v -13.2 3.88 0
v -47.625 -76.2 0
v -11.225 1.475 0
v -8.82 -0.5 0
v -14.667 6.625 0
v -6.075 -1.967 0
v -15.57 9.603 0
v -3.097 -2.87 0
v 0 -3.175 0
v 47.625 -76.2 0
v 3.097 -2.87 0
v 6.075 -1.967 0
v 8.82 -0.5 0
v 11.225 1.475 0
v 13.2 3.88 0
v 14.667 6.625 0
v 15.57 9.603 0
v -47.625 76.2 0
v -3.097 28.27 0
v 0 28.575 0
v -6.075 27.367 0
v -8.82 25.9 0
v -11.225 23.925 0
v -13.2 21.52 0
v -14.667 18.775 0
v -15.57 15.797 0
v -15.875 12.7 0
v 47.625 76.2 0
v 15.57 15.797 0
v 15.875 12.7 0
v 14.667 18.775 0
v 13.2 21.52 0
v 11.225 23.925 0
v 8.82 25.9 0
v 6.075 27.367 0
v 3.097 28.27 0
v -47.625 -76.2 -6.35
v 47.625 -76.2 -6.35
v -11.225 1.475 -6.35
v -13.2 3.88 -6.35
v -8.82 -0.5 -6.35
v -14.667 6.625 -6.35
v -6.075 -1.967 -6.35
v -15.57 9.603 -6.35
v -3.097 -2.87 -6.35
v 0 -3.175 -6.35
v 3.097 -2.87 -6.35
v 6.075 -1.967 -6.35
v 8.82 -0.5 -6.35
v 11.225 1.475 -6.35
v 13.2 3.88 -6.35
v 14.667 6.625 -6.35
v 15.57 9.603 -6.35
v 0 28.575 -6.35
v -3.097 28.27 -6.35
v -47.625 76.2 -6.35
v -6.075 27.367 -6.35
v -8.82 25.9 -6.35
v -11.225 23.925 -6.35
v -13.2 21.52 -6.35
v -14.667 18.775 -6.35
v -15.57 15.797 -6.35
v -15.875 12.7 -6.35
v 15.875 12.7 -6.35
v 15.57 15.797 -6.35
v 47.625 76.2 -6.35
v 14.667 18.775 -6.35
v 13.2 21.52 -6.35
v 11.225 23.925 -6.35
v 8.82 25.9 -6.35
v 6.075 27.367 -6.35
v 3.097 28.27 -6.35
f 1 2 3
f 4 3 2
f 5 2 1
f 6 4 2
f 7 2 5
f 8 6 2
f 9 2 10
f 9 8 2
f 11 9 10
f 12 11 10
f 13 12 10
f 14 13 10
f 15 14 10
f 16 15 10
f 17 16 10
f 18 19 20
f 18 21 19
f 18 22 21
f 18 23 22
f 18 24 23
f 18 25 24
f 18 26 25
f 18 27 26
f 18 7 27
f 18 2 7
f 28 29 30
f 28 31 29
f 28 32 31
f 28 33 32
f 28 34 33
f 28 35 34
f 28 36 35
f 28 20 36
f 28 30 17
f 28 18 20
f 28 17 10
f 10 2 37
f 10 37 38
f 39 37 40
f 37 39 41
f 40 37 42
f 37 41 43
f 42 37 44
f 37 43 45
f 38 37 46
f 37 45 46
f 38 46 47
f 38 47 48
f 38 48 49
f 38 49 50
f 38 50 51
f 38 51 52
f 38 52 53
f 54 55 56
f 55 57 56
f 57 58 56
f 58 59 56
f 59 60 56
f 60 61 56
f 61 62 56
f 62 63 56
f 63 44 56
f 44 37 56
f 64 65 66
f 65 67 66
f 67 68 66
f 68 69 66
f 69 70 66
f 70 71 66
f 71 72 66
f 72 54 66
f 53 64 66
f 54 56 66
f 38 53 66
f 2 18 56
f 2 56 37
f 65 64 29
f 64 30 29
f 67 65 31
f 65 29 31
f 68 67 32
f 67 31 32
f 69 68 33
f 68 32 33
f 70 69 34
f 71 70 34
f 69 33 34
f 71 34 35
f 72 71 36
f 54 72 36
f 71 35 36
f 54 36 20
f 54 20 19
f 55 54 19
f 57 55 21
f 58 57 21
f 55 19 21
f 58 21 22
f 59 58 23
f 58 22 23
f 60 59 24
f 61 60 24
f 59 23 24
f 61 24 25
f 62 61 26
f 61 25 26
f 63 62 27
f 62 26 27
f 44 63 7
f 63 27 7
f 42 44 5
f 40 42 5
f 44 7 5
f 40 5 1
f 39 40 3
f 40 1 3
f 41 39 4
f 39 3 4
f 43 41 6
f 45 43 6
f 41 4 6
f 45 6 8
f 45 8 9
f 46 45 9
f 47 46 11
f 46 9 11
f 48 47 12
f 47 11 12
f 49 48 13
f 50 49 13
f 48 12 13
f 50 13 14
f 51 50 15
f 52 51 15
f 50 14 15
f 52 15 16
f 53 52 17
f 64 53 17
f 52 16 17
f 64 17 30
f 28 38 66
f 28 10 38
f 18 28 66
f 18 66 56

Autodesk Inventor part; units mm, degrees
ref_plane "XZ Plane" through (0, 0, 0) normal (0, 1, 0) x (-1, 0, 0)
ref_plane "XY Plane" through (0, 0, 0) normal (0, 0, 1) x (1, 0, 0)
sketch "Sketch1" plane through (0, 0, 0) normal (0, 0, 1) x (1, 0, 0)
  line L0 (-47.625, -76.2) -> (47.625, -76.2)
  line L1 (47.625, -76.2) -> (47.625, 76.2)
  line L2 (47.625, 76.2) -> (-47.625, 76.2)
  line L3 (-47.625, 76.2) -> (-47.625, -76.2)
  line L4 (-47.625, -76.2) -> (47.625, 76.2) construction
  line L5 (47.625, -76.2) -> (-47.625, 76.2) construction
  point P0 (0, 0)
  dimension "d0" = 95.25
  dimension "d1" = 152.4
extrude "Extrusion1" add sketch "Sketch1" against normal blind 6.35
sketch "Sketch2" plane through (0, 0, 0) normal (0, 0, 1) x (1, 0, 0)
  circle A0 centre (0, 12.7) radius 15.875
  line L0 (47.625, 76.2) -> (-47.625, 76.2) projected
  point P0 (0, 0)
  dimension "bearingDiameter" = 31.75
  dimension "d5" = 63.5
extrude "Extrusion2" cut sketch "Sketch2" against normal through all
properties part number "plateForHangingMechanism" material "Aluminum 6061"
